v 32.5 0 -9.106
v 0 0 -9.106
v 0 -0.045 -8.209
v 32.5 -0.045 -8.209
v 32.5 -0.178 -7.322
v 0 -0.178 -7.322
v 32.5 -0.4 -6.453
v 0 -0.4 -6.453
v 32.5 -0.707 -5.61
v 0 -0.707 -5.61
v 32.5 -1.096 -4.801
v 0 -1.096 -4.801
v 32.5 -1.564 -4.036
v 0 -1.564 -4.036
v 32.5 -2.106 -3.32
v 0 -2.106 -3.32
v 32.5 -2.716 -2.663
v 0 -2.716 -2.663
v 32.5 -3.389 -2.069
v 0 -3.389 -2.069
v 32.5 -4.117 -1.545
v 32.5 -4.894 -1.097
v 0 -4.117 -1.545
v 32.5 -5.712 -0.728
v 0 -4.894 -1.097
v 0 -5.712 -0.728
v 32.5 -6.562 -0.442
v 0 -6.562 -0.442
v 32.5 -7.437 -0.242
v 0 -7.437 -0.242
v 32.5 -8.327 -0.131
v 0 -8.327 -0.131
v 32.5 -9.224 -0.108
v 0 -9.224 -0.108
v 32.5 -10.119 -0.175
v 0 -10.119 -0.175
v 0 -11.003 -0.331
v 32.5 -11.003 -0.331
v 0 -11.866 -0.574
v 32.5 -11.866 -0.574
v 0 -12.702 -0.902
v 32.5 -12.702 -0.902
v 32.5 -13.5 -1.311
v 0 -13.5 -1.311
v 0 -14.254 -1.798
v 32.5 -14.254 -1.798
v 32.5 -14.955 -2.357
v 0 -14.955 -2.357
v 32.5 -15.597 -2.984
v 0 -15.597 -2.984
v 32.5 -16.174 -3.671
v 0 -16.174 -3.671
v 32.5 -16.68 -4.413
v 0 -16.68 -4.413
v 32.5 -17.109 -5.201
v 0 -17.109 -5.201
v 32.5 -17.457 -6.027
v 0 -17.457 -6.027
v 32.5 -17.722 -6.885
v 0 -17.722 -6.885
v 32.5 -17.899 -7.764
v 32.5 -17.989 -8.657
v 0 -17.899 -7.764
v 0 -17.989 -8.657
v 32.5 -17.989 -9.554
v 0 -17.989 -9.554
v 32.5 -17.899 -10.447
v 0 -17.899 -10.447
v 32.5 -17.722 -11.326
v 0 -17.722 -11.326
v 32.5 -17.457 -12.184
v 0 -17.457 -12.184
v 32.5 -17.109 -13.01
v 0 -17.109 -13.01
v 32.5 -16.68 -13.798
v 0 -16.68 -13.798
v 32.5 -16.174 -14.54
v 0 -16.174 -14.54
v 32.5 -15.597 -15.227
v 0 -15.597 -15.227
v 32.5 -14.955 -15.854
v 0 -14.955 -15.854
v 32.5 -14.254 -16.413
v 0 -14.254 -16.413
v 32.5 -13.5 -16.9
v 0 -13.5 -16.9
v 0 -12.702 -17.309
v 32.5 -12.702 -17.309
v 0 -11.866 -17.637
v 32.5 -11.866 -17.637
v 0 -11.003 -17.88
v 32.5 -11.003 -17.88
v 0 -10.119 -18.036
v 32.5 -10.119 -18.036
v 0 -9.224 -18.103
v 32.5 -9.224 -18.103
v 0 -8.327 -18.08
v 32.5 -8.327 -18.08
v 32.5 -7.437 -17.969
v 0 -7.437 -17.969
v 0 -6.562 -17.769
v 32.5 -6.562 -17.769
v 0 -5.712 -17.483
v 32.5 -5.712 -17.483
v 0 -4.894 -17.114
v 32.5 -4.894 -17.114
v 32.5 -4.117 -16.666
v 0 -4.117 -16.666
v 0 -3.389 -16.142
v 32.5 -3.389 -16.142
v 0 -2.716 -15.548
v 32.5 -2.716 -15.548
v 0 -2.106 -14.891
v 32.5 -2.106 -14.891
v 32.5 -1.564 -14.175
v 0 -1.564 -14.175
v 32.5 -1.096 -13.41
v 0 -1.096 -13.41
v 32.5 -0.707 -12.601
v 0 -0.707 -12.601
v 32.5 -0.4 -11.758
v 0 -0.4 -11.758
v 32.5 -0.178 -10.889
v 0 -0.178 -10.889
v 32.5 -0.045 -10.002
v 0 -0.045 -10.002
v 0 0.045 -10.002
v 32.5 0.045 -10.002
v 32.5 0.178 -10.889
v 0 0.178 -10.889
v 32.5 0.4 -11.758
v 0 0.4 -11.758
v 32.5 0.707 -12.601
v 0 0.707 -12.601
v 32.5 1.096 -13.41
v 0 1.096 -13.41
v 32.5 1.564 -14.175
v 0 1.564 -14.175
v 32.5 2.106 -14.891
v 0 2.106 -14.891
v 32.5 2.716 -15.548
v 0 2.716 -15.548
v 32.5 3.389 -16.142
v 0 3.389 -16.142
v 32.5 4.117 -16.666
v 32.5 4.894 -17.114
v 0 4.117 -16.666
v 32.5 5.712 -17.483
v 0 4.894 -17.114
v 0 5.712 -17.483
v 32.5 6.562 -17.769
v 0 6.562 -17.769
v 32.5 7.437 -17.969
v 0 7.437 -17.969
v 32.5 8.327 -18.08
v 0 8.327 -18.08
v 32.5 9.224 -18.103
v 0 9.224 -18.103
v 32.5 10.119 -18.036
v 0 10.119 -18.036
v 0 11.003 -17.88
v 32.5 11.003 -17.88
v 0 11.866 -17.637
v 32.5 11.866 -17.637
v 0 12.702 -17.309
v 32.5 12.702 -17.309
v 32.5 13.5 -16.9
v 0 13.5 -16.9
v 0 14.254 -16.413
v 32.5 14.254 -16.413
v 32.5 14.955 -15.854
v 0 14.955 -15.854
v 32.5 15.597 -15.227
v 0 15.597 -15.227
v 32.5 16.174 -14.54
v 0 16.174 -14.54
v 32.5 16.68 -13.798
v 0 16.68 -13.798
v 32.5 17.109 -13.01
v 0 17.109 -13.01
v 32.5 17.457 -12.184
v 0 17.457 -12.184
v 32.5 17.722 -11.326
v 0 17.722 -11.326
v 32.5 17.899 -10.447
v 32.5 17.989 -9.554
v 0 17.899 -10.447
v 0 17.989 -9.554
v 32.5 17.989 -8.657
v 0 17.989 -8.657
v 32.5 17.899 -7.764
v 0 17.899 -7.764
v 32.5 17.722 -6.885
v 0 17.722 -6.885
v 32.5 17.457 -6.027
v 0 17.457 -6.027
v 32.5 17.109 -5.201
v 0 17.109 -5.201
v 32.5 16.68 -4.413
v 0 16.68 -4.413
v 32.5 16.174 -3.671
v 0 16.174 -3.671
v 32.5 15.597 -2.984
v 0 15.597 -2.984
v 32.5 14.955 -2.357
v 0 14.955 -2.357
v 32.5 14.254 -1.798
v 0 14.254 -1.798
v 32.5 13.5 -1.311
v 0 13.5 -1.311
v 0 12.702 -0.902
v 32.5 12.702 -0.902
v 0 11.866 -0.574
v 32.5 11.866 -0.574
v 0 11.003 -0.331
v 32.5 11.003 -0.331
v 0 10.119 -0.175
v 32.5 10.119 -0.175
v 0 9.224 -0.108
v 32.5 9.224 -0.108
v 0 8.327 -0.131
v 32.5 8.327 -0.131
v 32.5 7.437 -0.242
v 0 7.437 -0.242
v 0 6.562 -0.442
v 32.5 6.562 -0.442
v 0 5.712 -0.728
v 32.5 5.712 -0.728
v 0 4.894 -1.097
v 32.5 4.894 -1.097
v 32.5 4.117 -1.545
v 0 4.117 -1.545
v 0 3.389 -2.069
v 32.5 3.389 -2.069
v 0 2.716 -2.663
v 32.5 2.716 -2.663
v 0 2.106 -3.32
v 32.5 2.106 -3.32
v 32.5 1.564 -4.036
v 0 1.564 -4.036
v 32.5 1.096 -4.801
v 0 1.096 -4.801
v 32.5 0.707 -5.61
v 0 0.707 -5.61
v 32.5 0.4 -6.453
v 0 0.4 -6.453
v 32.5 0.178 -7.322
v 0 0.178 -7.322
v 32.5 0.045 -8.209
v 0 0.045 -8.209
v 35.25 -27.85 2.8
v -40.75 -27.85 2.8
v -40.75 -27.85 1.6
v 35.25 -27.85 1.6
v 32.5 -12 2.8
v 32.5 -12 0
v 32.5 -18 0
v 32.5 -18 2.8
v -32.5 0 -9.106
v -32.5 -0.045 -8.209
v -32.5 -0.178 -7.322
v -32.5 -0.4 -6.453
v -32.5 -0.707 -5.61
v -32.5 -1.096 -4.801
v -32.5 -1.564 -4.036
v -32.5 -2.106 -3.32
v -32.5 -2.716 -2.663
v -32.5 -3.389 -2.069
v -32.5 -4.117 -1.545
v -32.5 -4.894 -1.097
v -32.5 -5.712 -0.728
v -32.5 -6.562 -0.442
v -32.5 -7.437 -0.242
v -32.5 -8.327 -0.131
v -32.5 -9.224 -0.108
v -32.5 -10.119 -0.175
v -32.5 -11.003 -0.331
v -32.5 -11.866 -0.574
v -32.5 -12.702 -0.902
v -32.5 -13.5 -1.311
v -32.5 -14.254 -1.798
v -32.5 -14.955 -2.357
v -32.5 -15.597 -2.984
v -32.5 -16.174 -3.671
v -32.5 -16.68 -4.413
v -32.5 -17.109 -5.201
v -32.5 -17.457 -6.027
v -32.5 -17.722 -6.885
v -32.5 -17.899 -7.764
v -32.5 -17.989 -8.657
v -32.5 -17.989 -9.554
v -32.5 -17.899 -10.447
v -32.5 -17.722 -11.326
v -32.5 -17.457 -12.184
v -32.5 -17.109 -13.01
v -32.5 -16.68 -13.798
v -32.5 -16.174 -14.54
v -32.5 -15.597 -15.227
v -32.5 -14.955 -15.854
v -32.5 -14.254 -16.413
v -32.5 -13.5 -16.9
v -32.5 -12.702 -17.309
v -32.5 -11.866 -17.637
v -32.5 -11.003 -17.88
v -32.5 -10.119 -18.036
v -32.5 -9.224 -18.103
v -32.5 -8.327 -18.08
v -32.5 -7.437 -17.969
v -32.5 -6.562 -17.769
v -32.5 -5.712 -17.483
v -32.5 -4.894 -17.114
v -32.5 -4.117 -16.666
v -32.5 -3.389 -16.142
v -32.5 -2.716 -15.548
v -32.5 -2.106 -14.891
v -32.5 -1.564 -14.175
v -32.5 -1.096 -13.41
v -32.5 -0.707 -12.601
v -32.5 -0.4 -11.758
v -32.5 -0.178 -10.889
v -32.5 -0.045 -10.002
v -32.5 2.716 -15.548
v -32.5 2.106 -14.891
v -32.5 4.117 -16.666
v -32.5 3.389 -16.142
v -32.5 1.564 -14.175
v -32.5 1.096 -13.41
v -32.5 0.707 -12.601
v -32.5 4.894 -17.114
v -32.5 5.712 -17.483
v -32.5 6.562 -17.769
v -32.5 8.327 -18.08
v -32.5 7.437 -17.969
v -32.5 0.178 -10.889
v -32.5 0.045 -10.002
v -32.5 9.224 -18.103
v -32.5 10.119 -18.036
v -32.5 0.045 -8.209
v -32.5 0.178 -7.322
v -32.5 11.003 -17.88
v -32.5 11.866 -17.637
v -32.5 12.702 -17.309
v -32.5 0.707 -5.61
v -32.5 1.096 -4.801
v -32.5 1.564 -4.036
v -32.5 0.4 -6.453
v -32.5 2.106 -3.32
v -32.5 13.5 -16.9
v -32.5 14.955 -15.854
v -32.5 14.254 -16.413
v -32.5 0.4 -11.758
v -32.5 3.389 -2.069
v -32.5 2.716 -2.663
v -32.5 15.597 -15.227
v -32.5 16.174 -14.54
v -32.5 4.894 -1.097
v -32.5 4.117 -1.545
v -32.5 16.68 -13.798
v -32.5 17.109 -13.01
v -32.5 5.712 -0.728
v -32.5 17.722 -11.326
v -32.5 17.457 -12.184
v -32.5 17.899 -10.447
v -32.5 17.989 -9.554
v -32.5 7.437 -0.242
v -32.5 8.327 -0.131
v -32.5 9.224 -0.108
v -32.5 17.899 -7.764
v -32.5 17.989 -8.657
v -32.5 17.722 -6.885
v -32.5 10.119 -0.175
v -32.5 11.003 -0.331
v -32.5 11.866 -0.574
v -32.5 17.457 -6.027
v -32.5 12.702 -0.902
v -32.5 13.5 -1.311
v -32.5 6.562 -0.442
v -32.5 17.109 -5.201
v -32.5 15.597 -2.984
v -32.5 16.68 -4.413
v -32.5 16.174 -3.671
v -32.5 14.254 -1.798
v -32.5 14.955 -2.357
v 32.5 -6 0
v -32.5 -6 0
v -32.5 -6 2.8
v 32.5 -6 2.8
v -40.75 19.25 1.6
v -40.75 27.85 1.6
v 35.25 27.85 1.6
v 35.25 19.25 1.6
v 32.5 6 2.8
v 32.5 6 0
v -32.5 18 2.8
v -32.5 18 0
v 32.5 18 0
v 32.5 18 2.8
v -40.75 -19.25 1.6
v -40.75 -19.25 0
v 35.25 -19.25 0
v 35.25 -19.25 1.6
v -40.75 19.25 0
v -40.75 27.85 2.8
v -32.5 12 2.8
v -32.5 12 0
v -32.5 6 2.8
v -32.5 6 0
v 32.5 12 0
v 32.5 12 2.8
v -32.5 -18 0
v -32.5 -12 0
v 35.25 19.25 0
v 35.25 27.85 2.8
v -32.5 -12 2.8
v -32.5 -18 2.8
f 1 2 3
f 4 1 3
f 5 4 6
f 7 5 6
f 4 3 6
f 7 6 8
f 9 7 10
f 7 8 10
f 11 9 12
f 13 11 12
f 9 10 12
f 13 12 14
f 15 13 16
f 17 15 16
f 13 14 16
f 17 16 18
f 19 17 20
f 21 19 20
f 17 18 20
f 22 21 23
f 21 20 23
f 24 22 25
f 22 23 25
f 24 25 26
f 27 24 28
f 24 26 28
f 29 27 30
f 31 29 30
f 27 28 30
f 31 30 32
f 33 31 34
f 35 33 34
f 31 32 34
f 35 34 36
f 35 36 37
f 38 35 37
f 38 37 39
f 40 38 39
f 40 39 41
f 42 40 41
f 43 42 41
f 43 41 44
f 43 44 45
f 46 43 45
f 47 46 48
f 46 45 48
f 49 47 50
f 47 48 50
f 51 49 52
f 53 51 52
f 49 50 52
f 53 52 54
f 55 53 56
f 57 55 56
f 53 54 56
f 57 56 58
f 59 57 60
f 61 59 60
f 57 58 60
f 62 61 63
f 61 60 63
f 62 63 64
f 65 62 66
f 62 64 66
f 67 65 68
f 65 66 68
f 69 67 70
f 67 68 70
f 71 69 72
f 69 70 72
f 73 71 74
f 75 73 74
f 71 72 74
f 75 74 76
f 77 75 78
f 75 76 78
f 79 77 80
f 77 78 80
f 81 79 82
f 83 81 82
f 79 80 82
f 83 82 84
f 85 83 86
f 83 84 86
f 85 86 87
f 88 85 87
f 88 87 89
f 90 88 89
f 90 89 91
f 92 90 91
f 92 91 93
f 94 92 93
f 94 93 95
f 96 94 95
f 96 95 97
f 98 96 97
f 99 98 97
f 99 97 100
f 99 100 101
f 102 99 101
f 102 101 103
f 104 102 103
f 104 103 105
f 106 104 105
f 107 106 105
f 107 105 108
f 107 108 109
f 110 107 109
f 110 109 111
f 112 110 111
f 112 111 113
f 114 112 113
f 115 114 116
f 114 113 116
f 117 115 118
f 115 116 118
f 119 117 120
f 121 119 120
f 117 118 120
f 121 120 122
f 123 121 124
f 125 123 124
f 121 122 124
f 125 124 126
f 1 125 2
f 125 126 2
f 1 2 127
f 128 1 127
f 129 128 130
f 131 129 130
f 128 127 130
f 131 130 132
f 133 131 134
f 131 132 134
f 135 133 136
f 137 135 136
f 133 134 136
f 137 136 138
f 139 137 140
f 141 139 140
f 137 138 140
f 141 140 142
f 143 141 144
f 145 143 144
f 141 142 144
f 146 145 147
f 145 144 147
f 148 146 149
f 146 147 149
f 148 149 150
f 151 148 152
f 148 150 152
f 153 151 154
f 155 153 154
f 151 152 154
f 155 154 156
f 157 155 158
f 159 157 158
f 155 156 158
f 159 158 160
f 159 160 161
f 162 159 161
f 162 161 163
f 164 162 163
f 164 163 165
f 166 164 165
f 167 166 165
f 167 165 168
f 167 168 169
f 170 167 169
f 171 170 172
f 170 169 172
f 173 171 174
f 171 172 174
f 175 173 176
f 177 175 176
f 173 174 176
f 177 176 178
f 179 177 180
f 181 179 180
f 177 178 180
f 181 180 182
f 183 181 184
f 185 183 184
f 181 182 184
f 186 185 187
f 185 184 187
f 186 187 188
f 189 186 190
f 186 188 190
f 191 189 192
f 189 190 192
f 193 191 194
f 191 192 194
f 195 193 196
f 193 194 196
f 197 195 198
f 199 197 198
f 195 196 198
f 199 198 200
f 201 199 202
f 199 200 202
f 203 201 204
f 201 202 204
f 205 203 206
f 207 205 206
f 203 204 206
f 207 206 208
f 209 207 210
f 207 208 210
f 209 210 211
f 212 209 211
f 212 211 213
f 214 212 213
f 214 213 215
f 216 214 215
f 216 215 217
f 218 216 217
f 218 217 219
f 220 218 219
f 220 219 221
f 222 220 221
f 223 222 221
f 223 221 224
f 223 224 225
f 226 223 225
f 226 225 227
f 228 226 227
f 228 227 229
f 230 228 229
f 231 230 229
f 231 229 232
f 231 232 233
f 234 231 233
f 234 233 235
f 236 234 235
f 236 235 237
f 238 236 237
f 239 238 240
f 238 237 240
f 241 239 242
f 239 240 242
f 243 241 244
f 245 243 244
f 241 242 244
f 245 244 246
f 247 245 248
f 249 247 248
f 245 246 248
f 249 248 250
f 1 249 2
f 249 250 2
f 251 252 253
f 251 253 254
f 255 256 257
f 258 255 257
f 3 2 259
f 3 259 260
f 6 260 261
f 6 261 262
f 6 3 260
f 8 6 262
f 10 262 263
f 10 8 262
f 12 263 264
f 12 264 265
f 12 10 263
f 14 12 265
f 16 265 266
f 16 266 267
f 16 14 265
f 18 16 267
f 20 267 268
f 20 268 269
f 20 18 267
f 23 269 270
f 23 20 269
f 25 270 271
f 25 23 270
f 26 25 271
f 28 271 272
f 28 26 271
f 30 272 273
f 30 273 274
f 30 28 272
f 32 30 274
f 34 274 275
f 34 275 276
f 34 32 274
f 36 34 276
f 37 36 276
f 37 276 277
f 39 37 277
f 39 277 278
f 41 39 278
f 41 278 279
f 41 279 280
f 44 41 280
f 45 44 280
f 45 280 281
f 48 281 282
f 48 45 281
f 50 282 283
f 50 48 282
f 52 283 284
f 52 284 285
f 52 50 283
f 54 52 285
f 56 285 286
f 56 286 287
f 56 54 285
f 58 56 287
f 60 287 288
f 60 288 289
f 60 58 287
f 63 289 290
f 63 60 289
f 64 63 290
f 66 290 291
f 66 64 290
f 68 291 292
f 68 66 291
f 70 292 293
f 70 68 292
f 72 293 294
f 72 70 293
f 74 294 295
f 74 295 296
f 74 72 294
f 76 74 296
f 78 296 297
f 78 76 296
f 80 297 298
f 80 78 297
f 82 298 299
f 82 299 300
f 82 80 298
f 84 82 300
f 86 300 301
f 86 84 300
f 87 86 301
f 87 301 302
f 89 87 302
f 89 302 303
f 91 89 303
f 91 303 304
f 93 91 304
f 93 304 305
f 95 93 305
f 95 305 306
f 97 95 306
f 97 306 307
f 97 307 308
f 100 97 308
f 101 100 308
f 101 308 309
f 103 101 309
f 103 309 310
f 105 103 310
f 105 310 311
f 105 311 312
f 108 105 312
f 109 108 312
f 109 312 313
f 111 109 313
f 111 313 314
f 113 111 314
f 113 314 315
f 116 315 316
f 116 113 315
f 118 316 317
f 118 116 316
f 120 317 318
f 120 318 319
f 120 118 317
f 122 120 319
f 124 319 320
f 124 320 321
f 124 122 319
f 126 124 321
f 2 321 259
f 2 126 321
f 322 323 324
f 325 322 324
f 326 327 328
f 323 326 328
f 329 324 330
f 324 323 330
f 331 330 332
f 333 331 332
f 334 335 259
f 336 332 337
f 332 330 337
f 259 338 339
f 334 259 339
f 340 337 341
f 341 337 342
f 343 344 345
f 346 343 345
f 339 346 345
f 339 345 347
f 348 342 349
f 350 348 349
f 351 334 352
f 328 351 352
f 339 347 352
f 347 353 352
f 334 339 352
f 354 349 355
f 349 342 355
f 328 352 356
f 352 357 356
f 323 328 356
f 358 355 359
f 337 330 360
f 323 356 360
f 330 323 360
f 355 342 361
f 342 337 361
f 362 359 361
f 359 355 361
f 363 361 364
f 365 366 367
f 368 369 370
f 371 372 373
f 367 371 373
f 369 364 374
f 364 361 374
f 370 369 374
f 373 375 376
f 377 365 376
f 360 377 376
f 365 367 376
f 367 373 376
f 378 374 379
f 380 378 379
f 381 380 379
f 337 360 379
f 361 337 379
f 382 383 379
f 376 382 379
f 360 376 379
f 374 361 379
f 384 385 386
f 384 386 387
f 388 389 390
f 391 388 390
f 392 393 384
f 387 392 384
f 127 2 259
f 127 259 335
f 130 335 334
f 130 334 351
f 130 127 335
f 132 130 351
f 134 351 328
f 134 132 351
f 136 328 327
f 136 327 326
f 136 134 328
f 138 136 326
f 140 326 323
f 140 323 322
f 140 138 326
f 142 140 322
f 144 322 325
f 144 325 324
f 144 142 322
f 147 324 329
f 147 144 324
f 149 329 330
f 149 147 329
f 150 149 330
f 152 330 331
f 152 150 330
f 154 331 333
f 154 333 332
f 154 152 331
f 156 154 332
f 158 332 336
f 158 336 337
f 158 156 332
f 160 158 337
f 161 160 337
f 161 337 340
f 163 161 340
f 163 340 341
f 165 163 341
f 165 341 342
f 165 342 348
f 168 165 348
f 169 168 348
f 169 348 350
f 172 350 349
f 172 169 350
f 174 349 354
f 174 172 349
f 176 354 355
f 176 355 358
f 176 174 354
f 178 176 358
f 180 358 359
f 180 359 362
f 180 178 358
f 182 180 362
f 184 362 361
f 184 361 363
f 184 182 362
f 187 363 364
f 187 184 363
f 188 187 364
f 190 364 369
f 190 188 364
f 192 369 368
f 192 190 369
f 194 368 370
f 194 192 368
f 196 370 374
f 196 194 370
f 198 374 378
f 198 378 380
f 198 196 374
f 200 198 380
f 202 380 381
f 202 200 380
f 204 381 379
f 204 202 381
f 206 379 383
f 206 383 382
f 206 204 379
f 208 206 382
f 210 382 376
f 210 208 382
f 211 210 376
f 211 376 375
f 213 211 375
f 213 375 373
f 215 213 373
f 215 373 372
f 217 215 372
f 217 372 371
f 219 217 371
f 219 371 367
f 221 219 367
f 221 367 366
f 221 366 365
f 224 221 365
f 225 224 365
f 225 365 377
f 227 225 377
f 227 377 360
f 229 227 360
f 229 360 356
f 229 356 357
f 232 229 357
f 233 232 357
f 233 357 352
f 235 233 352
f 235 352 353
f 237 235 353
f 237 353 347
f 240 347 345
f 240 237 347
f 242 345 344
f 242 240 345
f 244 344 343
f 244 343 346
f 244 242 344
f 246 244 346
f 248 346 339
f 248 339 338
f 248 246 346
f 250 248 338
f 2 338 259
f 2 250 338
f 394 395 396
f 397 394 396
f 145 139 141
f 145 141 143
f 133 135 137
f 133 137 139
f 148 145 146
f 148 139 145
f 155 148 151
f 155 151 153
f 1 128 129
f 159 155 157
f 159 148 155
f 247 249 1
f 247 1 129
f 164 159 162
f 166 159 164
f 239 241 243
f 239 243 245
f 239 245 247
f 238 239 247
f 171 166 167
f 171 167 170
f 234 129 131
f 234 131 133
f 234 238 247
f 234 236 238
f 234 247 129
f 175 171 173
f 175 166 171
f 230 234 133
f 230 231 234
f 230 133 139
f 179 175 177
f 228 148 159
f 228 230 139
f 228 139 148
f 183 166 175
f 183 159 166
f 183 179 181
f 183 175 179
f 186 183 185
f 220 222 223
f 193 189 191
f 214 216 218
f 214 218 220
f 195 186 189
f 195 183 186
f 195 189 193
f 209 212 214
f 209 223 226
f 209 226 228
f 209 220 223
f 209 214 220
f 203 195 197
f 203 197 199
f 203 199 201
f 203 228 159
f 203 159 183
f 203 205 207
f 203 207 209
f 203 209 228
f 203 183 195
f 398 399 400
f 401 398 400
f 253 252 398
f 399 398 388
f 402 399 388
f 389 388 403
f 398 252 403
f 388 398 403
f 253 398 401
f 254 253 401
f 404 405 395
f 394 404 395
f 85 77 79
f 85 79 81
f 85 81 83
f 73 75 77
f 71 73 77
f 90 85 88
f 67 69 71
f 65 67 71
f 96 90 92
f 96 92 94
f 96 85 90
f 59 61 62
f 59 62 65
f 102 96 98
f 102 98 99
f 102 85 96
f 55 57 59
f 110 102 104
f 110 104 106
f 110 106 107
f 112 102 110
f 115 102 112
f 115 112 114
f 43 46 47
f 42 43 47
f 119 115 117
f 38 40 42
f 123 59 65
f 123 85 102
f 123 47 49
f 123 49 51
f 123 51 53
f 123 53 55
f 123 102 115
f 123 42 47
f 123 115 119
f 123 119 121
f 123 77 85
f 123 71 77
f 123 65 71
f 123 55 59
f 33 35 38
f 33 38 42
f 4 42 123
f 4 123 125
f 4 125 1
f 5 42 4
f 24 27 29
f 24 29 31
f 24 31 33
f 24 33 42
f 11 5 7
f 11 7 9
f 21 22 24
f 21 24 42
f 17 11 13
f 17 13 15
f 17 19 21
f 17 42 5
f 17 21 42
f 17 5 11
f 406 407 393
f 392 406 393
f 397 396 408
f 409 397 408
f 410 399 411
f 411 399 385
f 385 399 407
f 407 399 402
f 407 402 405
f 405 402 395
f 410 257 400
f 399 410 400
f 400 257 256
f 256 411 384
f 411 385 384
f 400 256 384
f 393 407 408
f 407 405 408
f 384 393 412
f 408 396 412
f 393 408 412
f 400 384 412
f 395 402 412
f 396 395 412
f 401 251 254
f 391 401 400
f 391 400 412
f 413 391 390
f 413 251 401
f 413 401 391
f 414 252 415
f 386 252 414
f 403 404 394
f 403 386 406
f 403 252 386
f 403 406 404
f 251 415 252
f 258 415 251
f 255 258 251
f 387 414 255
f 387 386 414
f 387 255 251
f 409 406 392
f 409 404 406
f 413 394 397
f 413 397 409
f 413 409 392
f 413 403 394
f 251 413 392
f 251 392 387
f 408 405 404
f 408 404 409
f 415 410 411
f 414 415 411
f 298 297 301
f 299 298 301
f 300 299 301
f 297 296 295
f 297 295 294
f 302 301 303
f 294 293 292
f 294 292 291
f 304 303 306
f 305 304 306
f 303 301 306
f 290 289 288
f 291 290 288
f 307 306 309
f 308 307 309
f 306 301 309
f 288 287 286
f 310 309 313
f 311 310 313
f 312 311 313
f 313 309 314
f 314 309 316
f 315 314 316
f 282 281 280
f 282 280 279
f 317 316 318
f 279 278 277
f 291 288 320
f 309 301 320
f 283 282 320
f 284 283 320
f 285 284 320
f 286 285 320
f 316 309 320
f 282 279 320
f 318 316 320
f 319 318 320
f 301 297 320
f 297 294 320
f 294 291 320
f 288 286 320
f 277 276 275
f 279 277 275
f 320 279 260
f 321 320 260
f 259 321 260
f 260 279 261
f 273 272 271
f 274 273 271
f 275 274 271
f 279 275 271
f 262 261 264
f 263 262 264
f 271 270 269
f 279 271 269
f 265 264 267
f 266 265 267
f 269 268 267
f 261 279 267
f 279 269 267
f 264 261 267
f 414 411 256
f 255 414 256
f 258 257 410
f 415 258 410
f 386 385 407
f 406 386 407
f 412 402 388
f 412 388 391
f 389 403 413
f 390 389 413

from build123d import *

# Parameters (mm, degrees)
F0_R     = 9
F1_DEPTH = 32.5
F2_W     = 76
F2_H     = 38.5
F2_W_2   = 65
F2_H_2   = 6
F3_DEPTH = 2.8
F4_W     = 76
F4_H     = 8.6
F5_DEPTH = 1.2


with BuildPart() as f1:
    # F0 (on Right) → F1 (new body, symmetric)
    with BuildSketch(Plane.YZ):
        with BuildLine():
            ThreePointArc((0, -9.105528), (9, -18.105528), (18, -9.105528))
            ThreePointArc((18, -9.105528), (9, -0.105528), (0, -9.105528))
        make_face()
        with Locations((-9, -9.105528)):
            Circle(F0_R)
    extrude(amount=F1_DEPTH, both=True)


with BuildPart() as f3:
    # F2 (on Top) → F3 (new body)
    with BuildSketch(Plane.XY):
        with Locations((-2.75, 0)):
            Rectangle(F2_W, F2_H)
        Polygon((-32.5, 12), (-32.5, 18), (32.5, 18), (32.5, 12), (32.5, 6), (32.5, 0), (32.5, -6), (32.5, -12), (32.5, -18), (-32.5, -18), (-32.5, -12), (-32.5, -6), (-32.5, 0), (-32.5, 6), align=None, mode=Mode.SUBTRACT)
        with Locations((0, -9)):
            Rectangle(F2_W_2, F2_H_2)
        with Locations((0, 9)):
            Rectangle(F2_W_2, F2_H_2)
    extrude(amount=F3_DEPTH)

    # F4 (on face) → F5 (join)
    with BuildSketch(Plane.XY.offset(2.8)):
        with Locations((-2.75, 23.55)):
            Rectangle(F4_W, F4_H)
        with Locations((-2.75, -23.55)):
            Rectangle(F4_W, F4_H)
    extrude(amount=-F5_DEPTH)


solid = Compound([f1.part, f3.part])
